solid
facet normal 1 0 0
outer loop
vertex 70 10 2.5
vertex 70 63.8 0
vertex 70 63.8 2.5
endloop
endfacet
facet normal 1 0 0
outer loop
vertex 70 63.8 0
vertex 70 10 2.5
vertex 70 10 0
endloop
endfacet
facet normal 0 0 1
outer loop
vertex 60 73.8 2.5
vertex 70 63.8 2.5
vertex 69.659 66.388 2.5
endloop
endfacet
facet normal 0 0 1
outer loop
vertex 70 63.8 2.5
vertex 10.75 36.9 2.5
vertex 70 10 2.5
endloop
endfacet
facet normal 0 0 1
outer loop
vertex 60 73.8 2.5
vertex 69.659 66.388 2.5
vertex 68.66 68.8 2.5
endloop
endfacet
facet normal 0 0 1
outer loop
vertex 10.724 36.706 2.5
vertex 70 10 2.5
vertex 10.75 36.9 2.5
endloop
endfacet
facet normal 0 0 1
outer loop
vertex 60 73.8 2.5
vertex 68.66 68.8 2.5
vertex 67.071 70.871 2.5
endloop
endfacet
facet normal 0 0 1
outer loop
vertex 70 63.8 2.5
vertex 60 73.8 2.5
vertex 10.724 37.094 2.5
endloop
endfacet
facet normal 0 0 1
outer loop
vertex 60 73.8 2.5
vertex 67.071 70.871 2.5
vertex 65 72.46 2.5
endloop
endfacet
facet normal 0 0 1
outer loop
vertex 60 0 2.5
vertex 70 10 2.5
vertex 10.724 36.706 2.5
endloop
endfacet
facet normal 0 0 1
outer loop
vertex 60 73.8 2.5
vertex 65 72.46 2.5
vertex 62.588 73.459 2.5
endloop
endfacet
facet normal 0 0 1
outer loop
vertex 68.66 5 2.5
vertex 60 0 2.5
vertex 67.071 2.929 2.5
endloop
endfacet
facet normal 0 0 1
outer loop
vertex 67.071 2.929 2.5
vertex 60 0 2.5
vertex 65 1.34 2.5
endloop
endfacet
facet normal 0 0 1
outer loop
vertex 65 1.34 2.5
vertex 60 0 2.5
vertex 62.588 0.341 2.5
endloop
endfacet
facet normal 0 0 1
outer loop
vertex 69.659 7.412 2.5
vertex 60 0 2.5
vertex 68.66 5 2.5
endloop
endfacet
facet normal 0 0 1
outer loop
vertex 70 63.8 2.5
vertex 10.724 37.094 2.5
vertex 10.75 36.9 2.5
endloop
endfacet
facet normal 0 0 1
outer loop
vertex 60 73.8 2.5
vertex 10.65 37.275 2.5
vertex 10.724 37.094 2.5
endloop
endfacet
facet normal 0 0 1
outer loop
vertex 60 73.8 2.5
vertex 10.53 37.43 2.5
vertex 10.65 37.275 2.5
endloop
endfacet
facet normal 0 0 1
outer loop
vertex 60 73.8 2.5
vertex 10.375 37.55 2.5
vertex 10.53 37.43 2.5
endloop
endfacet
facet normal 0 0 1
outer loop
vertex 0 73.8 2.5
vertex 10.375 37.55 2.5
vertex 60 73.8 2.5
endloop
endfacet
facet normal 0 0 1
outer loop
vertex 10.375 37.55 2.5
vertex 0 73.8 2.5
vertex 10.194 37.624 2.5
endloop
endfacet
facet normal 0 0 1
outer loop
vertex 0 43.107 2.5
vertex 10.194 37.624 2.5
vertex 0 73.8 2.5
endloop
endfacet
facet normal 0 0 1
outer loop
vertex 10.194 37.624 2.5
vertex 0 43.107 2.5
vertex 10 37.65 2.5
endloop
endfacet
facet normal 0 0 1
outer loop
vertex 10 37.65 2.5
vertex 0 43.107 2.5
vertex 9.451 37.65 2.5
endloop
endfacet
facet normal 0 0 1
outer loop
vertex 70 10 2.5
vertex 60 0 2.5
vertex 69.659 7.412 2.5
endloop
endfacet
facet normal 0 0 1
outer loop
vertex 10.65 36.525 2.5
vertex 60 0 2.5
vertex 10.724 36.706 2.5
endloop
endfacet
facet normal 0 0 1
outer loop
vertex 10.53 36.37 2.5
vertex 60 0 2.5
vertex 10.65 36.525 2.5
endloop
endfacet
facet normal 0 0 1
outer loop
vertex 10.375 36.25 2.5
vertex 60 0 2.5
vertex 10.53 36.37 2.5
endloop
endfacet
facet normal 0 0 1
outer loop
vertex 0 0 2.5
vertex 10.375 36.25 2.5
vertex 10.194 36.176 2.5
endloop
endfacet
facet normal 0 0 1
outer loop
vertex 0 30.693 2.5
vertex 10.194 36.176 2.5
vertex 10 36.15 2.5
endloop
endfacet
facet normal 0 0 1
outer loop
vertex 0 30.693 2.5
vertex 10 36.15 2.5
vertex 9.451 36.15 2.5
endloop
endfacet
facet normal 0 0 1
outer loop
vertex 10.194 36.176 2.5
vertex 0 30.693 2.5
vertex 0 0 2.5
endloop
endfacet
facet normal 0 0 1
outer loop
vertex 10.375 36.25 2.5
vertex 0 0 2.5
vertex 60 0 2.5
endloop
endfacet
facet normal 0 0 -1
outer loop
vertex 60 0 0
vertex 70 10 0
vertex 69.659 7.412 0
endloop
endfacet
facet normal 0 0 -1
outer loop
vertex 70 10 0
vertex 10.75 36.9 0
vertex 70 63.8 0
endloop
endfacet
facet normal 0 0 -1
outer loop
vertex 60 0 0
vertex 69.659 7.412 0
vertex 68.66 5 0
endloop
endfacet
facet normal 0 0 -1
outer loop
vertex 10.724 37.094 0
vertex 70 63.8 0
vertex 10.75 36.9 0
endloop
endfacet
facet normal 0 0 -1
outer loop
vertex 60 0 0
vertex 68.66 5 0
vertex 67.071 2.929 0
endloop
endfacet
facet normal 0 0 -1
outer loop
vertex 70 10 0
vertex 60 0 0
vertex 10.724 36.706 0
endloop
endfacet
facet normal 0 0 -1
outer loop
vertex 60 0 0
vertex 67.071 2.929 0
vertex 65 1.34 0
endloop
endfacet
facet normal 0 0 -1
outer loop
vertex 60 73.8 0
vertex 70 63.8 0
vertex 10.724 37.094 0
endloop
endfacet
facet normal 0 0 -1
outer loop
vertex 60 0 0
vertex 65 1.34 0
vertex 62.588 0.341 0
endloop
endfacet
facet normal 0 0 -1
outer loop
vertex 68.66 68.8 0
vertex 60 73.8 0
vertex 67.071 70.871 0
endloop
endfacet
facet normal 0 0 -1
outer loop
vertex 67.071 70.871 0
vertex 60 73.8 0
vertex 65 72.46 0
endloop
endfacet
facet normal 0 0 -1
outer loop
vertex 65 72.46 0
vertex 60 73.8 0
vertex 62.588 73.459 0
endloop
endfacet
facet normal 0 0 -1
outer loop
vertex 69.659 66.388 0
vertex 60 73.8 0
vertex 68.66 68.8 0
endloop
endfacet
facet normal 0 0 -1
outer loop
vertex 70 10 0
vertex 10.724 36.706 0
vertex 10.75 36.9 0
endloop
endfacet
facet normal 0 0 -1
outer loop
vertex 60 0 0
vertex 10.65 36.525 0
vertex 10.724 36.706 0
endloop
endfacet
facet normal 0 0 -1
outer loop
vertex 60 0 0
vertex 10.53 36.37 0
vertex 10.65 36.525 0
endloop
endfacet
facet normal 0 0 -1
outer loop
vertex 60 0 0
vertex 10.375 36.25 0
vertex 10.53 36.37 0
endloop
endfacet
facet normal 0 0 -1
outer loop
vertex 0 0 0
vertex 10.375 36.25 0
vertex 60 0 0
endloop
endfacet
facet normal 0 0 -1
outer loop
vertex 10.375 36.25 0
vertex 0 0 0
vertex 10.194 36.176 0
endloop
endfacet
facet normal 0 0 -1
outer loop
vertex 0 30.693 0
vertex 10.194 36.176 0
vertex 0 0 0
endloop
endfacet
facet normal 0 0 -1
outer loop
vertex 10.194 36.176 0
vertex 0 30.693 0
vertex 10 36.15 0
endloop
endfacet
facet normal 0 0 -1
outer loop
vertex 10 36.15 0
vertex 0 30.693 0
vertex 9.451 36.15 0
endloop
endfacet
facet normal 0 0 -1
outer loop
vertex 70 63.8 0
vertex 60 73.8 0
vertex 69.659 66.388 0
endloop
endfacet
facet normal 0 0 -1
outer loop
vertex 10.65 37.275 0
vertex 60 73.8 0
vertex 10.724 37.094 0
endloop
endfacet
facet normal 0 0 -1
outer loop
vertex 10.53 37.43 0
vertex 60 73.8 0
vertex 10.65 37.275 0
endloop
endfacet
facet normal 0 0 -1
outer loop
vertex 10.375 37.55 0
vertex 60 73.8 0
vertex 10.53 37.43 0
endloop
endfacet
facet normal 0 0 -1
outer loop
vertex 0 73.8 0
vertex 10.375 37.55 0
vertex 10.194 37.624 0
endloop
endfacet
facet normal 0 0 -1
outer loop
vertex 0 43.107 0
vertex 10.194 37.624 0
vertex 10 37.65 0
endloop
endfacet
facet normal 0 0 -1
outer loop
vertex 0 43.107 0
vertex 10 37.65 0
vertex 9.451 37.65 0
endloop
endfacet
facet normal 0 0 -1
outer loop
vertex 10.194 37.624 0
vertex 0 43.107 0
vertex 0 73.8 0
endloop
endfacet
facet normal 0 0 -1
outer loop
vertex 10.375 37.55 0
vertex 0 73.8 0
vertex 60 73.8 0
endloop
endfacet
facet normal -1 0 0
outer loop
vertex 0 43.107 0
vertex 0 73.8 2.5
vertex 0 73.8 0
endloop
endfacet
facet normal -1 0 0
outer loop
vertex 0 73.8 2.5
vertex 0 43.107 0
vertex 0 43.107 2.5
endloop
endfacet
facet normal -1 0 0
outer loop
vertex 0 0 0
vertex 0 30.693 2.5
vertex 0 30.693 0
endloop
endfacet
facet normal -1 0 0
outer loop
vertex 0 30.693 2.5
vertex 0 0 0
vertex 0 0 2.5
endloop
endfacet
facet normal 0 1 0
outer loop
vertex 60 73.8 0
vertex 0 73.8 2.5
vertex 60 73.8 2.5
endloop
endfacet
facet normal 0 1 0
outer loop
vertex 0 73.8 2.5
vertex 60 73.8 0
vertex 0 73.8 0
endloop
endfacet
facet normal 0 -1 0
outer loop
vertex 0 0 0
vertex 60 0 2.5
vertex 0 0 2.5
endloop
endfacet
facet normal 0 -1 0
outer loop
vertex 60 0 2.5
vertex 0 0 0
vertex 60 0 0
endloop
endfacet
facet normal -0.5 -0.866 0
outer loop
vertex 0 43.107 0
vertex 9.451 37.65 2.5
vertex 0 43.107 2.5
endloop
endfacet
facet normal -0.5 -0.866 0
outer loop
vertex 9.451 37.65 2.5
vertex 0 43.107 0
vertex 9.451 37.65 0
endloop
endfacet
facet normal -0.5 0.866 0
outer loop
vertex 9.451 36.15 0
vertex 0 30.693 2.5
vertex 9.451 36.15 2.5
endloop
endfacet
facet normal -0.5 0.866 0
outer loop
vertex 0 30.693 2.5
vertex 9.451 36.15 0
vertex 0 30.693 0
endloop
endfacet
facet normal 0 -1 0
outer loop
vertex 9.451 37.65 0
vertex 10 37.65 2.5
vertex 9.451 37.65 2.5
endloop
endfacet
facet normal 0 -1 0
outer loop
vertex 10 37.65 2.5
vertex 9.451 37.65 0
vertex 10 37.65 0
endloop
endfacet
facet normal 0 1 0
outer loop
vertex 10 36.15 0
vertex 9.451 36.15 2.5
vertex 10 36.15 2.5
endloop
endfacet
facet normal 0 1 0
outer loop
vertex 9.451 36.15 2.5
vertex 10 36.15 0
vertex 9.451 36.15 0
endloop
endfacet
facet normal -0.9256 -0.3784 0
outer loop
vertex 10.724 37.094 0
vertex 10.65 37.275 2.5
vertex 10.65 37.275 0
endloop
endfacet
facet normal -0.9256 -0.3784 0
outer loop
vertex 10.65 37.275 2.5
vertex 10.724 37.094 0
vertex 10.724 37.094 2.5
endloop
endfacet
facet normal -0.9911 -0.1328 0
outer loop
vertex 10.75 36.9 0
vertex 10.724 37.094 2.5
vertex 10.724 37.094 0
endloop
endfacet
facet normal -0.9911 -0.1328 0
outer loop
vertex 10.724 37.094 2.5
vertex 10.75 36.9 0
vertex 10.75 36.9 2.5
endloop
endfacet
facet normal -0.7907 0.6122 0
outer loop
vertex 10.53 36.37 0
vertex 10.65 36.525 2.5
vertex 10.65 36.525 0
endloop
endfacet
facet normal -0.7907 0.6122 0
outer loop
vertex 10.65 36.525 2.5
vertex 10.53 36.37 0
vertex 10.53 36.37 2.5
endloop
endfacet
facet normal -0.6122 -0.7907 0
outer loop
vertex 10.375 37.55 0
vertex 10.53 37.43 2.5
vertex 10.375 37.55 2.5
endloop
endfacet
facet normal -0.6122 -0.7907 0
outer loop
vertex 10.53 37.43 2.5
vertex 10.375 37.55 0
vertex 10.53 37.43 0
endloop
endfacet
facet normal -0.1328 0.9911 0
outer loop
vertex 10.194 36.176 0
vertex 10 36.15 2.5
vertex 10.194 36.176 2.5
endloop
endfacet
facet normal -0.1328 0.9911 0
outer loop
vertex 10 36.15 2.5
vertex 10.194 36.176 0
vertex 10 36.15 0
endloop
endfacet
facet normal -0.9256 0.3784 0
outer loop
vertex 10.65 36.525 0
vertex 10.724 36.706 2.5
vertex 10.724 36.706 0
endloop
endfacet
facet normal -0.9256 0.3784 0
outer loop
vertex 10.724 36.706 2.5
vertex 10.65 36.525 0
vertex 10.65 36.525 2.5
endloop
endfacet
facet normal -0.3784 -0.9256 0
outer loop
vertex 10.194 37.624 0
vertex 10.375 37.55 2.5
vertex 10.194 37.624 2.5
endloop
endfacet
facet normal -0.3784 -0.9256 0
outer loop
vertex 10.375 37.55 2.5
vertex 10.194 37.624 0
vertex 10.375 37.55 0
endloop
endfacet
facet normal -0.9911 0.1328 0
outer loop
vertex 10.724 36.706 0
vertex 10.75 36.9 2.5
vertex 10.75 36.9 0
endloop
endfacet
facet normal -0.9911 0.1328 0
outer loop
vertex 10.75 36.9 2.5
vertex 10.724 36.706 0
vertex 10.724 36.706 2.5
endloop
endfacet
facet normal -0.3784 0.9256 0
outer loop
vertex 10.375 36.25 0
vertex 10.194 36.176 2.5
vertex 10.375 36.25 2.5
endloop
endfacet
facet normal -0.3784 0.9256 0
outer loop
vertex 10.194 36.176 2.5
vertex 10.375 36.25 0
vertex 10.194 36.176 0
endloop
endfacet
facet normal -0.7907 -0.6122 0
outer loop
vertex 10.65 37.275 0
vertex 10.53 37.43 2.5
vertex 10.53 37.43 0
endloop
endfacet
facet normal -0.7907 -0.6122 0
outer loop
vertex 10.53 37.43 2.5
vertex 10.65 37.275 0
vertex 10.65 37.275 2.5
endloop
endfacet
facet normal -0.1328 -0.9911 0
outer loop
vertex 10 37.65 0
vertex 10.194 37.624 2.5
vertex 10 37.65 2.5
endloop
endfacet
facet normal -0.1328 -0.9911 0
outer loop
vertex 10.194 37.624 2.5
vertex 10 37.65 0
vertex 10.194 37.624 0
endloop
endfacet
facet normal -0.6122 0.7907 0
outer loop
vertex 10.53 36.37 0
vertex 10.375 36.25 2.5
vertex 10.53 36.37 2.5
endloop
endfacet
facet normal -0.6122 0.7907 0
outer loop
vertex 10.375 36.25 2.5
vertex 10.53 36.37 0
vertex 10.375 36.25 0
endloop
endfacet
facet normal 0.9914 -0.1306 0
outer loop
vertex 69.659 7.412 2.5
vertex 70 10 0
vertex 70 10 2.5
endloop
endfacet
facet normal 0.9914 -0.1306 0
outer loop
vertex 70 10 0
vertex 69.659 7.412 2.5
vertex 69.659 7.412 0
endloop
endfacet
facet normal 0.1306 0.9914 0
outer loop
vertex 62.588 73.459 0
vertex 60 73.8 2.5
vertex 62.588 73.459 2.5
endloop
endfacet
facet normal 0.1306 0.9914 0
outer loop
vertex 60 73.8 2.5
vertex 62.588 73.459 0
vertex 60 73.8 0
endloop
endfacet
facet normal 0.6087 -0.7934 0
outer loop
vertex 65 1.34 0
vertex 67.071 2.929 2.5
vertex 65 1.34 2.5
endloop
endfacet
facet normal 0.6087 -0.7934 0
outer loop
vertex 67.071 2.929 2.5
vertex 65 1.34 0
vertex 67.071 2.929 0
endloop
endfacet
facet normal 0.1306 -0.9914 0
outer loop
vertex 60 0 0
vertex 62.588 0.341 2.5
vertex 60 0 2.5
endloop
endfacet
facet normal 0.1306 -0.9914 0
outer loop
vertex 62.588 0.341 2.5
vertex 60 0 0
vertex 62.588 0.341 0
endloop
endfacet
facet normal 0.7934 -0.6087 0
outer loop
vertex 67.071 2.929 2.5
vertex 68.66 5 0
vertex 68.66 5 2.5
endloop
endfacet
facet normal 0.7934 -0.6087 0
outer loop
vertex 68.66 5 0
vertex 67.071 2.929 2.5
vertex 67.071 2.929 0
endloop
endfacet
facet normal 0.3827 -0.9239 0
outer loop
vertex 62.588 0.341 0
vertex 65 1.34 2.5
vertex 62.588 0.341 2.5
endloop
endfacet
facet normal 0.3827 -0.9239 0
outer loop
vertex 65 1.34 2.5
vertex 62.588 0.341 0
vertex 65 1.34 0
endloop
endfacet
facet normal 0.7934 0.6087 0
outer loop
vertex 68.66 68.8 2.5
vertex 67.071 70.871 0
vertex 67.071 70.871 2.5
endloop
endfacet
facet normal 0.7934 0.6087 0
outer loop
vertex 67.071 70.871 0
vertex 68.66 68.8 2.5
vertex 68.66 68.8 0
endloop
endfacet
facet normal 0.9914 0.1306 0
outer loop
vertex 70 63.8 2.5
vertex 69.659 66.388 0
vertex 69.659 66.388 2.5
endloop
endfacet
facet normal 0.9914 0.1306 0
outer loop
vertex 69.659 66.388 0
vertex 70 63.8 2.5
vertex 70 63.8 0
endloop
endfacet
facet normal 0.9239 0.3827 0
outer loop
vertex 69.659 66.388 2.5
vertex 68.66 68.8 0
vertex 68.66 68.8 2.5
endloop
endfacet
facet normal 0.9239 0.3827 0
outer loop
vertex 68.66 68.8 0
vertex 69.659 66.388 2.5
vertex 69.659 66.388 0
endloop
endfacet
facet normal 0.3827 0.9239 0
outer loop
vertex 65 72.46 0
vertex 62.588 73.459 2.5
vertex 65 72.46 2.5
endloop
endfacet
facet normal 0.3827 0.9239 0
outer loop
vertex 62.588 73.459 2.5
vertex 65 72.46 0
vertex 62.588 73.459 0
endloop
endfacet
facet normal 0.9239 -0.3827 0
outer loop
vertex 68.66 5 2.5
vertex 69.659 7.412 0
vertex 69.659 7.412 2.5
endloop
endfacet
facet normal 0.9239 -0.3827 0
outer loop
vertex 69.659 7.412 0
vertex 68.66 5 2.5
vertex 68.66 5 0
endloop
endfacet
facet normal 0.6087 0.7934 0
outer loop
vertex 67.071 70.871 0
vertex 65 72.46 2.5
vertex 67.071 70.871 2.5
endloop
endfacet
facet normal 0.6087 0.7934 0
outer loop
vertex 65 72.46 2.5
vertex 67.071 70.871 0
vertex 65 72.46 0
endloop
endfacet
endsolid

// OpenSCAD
// Drilling gide

// Copyright (C) 2020 Jeremy Bennett <www.jeremybennett.com>

// Contributor: Jeremy Bennett <jeremy.bennett@embecosm.com>

// This file is licensed under the Creative Commons Attribution-ShareAlike 3.0
// Unported License. To view a copy of this license, visit
// http://creativecommons.org/licenses/by-sa/3.0/ or send a letter to Creative
// Commons, PO Box 1866, Mountain View, CA 94042, USA.


// A guide for drilling holes in the WCU enclosure.


// Very small value
EPS = 0.001;

// Very large value
INF = 100;

// M3 dimensions
M3_SCREW_D = 3.0;
M3_NUT_D = 5.5;
M3_NUT_H = 2.5;

// End face dimensions
END_H = 70.0;
END_W = 73.8;

// Hole radius
HOLE_R = 1.5 / 2;

// Corner radius
CORNER_R = 10;

// Hole offset from top
HOLE_OFFSET = 10.0;

// Template depth
TEMPLATE_D = 2.5;

// The wedge is a triangle that touches the bottom of the drill hole
module wedge() {
     cylinder(r = HOLE_OFFSET + HOLE_R, h = TEMPLATE_D * 2, $fn = 3);
}

// The slot ensures the hole is not pinched by the wedge
module slot () {
     cube(size = [HOLE_OFFSET, HOLE_R * 2, TEMPLATE_D * 2]);
}

module hole() {
     cylinder(r = HOLE_R, h = TEMPLATE_D * 2, $fn = 24);
}

// The overall outline is used to clip the corners
module outline() {
     hull() {
	  translate(v = [END_H - CORNER_R, CORNER_R])
	       cylinder(r = CORNER_R, h = TEMPLATE_D * 2, $fn = 24);
	  translate(v = [END_H - CORNER_R, END_W - CORNER_R])
	       cylinder(r = CORNER_R, h = TEMPLATE_D * 2, $fn = 24);
	  translate(v = [0, END_W - CORNER_R])
	       cylinder(r = CORNER_R, h = TEMPLATE_D * 2, $fn = 24);
	  translate(v = [0, CORNER_R])
	       cylinder(r = CORNER_R, h = TEMPLATE_D * 2, $fn = 24);
     }
}

intersection() {
     outline();
     difference () {
	  cube(size = [END_H, END_W, TEMPLATE_D]);
	  translate(v = [0, END_W / 2, -TEMPLATE_D / 2])
	       wedge();
	  translate(v = [0, END_W / 2 - HOLE_R, -TEMPLATE_D / 2])
	       slot();
	  translate(v = [HOLE_OFFSET, END_W / 2, -TEMPLATE_D / 2])
	       hole();
     }
}
